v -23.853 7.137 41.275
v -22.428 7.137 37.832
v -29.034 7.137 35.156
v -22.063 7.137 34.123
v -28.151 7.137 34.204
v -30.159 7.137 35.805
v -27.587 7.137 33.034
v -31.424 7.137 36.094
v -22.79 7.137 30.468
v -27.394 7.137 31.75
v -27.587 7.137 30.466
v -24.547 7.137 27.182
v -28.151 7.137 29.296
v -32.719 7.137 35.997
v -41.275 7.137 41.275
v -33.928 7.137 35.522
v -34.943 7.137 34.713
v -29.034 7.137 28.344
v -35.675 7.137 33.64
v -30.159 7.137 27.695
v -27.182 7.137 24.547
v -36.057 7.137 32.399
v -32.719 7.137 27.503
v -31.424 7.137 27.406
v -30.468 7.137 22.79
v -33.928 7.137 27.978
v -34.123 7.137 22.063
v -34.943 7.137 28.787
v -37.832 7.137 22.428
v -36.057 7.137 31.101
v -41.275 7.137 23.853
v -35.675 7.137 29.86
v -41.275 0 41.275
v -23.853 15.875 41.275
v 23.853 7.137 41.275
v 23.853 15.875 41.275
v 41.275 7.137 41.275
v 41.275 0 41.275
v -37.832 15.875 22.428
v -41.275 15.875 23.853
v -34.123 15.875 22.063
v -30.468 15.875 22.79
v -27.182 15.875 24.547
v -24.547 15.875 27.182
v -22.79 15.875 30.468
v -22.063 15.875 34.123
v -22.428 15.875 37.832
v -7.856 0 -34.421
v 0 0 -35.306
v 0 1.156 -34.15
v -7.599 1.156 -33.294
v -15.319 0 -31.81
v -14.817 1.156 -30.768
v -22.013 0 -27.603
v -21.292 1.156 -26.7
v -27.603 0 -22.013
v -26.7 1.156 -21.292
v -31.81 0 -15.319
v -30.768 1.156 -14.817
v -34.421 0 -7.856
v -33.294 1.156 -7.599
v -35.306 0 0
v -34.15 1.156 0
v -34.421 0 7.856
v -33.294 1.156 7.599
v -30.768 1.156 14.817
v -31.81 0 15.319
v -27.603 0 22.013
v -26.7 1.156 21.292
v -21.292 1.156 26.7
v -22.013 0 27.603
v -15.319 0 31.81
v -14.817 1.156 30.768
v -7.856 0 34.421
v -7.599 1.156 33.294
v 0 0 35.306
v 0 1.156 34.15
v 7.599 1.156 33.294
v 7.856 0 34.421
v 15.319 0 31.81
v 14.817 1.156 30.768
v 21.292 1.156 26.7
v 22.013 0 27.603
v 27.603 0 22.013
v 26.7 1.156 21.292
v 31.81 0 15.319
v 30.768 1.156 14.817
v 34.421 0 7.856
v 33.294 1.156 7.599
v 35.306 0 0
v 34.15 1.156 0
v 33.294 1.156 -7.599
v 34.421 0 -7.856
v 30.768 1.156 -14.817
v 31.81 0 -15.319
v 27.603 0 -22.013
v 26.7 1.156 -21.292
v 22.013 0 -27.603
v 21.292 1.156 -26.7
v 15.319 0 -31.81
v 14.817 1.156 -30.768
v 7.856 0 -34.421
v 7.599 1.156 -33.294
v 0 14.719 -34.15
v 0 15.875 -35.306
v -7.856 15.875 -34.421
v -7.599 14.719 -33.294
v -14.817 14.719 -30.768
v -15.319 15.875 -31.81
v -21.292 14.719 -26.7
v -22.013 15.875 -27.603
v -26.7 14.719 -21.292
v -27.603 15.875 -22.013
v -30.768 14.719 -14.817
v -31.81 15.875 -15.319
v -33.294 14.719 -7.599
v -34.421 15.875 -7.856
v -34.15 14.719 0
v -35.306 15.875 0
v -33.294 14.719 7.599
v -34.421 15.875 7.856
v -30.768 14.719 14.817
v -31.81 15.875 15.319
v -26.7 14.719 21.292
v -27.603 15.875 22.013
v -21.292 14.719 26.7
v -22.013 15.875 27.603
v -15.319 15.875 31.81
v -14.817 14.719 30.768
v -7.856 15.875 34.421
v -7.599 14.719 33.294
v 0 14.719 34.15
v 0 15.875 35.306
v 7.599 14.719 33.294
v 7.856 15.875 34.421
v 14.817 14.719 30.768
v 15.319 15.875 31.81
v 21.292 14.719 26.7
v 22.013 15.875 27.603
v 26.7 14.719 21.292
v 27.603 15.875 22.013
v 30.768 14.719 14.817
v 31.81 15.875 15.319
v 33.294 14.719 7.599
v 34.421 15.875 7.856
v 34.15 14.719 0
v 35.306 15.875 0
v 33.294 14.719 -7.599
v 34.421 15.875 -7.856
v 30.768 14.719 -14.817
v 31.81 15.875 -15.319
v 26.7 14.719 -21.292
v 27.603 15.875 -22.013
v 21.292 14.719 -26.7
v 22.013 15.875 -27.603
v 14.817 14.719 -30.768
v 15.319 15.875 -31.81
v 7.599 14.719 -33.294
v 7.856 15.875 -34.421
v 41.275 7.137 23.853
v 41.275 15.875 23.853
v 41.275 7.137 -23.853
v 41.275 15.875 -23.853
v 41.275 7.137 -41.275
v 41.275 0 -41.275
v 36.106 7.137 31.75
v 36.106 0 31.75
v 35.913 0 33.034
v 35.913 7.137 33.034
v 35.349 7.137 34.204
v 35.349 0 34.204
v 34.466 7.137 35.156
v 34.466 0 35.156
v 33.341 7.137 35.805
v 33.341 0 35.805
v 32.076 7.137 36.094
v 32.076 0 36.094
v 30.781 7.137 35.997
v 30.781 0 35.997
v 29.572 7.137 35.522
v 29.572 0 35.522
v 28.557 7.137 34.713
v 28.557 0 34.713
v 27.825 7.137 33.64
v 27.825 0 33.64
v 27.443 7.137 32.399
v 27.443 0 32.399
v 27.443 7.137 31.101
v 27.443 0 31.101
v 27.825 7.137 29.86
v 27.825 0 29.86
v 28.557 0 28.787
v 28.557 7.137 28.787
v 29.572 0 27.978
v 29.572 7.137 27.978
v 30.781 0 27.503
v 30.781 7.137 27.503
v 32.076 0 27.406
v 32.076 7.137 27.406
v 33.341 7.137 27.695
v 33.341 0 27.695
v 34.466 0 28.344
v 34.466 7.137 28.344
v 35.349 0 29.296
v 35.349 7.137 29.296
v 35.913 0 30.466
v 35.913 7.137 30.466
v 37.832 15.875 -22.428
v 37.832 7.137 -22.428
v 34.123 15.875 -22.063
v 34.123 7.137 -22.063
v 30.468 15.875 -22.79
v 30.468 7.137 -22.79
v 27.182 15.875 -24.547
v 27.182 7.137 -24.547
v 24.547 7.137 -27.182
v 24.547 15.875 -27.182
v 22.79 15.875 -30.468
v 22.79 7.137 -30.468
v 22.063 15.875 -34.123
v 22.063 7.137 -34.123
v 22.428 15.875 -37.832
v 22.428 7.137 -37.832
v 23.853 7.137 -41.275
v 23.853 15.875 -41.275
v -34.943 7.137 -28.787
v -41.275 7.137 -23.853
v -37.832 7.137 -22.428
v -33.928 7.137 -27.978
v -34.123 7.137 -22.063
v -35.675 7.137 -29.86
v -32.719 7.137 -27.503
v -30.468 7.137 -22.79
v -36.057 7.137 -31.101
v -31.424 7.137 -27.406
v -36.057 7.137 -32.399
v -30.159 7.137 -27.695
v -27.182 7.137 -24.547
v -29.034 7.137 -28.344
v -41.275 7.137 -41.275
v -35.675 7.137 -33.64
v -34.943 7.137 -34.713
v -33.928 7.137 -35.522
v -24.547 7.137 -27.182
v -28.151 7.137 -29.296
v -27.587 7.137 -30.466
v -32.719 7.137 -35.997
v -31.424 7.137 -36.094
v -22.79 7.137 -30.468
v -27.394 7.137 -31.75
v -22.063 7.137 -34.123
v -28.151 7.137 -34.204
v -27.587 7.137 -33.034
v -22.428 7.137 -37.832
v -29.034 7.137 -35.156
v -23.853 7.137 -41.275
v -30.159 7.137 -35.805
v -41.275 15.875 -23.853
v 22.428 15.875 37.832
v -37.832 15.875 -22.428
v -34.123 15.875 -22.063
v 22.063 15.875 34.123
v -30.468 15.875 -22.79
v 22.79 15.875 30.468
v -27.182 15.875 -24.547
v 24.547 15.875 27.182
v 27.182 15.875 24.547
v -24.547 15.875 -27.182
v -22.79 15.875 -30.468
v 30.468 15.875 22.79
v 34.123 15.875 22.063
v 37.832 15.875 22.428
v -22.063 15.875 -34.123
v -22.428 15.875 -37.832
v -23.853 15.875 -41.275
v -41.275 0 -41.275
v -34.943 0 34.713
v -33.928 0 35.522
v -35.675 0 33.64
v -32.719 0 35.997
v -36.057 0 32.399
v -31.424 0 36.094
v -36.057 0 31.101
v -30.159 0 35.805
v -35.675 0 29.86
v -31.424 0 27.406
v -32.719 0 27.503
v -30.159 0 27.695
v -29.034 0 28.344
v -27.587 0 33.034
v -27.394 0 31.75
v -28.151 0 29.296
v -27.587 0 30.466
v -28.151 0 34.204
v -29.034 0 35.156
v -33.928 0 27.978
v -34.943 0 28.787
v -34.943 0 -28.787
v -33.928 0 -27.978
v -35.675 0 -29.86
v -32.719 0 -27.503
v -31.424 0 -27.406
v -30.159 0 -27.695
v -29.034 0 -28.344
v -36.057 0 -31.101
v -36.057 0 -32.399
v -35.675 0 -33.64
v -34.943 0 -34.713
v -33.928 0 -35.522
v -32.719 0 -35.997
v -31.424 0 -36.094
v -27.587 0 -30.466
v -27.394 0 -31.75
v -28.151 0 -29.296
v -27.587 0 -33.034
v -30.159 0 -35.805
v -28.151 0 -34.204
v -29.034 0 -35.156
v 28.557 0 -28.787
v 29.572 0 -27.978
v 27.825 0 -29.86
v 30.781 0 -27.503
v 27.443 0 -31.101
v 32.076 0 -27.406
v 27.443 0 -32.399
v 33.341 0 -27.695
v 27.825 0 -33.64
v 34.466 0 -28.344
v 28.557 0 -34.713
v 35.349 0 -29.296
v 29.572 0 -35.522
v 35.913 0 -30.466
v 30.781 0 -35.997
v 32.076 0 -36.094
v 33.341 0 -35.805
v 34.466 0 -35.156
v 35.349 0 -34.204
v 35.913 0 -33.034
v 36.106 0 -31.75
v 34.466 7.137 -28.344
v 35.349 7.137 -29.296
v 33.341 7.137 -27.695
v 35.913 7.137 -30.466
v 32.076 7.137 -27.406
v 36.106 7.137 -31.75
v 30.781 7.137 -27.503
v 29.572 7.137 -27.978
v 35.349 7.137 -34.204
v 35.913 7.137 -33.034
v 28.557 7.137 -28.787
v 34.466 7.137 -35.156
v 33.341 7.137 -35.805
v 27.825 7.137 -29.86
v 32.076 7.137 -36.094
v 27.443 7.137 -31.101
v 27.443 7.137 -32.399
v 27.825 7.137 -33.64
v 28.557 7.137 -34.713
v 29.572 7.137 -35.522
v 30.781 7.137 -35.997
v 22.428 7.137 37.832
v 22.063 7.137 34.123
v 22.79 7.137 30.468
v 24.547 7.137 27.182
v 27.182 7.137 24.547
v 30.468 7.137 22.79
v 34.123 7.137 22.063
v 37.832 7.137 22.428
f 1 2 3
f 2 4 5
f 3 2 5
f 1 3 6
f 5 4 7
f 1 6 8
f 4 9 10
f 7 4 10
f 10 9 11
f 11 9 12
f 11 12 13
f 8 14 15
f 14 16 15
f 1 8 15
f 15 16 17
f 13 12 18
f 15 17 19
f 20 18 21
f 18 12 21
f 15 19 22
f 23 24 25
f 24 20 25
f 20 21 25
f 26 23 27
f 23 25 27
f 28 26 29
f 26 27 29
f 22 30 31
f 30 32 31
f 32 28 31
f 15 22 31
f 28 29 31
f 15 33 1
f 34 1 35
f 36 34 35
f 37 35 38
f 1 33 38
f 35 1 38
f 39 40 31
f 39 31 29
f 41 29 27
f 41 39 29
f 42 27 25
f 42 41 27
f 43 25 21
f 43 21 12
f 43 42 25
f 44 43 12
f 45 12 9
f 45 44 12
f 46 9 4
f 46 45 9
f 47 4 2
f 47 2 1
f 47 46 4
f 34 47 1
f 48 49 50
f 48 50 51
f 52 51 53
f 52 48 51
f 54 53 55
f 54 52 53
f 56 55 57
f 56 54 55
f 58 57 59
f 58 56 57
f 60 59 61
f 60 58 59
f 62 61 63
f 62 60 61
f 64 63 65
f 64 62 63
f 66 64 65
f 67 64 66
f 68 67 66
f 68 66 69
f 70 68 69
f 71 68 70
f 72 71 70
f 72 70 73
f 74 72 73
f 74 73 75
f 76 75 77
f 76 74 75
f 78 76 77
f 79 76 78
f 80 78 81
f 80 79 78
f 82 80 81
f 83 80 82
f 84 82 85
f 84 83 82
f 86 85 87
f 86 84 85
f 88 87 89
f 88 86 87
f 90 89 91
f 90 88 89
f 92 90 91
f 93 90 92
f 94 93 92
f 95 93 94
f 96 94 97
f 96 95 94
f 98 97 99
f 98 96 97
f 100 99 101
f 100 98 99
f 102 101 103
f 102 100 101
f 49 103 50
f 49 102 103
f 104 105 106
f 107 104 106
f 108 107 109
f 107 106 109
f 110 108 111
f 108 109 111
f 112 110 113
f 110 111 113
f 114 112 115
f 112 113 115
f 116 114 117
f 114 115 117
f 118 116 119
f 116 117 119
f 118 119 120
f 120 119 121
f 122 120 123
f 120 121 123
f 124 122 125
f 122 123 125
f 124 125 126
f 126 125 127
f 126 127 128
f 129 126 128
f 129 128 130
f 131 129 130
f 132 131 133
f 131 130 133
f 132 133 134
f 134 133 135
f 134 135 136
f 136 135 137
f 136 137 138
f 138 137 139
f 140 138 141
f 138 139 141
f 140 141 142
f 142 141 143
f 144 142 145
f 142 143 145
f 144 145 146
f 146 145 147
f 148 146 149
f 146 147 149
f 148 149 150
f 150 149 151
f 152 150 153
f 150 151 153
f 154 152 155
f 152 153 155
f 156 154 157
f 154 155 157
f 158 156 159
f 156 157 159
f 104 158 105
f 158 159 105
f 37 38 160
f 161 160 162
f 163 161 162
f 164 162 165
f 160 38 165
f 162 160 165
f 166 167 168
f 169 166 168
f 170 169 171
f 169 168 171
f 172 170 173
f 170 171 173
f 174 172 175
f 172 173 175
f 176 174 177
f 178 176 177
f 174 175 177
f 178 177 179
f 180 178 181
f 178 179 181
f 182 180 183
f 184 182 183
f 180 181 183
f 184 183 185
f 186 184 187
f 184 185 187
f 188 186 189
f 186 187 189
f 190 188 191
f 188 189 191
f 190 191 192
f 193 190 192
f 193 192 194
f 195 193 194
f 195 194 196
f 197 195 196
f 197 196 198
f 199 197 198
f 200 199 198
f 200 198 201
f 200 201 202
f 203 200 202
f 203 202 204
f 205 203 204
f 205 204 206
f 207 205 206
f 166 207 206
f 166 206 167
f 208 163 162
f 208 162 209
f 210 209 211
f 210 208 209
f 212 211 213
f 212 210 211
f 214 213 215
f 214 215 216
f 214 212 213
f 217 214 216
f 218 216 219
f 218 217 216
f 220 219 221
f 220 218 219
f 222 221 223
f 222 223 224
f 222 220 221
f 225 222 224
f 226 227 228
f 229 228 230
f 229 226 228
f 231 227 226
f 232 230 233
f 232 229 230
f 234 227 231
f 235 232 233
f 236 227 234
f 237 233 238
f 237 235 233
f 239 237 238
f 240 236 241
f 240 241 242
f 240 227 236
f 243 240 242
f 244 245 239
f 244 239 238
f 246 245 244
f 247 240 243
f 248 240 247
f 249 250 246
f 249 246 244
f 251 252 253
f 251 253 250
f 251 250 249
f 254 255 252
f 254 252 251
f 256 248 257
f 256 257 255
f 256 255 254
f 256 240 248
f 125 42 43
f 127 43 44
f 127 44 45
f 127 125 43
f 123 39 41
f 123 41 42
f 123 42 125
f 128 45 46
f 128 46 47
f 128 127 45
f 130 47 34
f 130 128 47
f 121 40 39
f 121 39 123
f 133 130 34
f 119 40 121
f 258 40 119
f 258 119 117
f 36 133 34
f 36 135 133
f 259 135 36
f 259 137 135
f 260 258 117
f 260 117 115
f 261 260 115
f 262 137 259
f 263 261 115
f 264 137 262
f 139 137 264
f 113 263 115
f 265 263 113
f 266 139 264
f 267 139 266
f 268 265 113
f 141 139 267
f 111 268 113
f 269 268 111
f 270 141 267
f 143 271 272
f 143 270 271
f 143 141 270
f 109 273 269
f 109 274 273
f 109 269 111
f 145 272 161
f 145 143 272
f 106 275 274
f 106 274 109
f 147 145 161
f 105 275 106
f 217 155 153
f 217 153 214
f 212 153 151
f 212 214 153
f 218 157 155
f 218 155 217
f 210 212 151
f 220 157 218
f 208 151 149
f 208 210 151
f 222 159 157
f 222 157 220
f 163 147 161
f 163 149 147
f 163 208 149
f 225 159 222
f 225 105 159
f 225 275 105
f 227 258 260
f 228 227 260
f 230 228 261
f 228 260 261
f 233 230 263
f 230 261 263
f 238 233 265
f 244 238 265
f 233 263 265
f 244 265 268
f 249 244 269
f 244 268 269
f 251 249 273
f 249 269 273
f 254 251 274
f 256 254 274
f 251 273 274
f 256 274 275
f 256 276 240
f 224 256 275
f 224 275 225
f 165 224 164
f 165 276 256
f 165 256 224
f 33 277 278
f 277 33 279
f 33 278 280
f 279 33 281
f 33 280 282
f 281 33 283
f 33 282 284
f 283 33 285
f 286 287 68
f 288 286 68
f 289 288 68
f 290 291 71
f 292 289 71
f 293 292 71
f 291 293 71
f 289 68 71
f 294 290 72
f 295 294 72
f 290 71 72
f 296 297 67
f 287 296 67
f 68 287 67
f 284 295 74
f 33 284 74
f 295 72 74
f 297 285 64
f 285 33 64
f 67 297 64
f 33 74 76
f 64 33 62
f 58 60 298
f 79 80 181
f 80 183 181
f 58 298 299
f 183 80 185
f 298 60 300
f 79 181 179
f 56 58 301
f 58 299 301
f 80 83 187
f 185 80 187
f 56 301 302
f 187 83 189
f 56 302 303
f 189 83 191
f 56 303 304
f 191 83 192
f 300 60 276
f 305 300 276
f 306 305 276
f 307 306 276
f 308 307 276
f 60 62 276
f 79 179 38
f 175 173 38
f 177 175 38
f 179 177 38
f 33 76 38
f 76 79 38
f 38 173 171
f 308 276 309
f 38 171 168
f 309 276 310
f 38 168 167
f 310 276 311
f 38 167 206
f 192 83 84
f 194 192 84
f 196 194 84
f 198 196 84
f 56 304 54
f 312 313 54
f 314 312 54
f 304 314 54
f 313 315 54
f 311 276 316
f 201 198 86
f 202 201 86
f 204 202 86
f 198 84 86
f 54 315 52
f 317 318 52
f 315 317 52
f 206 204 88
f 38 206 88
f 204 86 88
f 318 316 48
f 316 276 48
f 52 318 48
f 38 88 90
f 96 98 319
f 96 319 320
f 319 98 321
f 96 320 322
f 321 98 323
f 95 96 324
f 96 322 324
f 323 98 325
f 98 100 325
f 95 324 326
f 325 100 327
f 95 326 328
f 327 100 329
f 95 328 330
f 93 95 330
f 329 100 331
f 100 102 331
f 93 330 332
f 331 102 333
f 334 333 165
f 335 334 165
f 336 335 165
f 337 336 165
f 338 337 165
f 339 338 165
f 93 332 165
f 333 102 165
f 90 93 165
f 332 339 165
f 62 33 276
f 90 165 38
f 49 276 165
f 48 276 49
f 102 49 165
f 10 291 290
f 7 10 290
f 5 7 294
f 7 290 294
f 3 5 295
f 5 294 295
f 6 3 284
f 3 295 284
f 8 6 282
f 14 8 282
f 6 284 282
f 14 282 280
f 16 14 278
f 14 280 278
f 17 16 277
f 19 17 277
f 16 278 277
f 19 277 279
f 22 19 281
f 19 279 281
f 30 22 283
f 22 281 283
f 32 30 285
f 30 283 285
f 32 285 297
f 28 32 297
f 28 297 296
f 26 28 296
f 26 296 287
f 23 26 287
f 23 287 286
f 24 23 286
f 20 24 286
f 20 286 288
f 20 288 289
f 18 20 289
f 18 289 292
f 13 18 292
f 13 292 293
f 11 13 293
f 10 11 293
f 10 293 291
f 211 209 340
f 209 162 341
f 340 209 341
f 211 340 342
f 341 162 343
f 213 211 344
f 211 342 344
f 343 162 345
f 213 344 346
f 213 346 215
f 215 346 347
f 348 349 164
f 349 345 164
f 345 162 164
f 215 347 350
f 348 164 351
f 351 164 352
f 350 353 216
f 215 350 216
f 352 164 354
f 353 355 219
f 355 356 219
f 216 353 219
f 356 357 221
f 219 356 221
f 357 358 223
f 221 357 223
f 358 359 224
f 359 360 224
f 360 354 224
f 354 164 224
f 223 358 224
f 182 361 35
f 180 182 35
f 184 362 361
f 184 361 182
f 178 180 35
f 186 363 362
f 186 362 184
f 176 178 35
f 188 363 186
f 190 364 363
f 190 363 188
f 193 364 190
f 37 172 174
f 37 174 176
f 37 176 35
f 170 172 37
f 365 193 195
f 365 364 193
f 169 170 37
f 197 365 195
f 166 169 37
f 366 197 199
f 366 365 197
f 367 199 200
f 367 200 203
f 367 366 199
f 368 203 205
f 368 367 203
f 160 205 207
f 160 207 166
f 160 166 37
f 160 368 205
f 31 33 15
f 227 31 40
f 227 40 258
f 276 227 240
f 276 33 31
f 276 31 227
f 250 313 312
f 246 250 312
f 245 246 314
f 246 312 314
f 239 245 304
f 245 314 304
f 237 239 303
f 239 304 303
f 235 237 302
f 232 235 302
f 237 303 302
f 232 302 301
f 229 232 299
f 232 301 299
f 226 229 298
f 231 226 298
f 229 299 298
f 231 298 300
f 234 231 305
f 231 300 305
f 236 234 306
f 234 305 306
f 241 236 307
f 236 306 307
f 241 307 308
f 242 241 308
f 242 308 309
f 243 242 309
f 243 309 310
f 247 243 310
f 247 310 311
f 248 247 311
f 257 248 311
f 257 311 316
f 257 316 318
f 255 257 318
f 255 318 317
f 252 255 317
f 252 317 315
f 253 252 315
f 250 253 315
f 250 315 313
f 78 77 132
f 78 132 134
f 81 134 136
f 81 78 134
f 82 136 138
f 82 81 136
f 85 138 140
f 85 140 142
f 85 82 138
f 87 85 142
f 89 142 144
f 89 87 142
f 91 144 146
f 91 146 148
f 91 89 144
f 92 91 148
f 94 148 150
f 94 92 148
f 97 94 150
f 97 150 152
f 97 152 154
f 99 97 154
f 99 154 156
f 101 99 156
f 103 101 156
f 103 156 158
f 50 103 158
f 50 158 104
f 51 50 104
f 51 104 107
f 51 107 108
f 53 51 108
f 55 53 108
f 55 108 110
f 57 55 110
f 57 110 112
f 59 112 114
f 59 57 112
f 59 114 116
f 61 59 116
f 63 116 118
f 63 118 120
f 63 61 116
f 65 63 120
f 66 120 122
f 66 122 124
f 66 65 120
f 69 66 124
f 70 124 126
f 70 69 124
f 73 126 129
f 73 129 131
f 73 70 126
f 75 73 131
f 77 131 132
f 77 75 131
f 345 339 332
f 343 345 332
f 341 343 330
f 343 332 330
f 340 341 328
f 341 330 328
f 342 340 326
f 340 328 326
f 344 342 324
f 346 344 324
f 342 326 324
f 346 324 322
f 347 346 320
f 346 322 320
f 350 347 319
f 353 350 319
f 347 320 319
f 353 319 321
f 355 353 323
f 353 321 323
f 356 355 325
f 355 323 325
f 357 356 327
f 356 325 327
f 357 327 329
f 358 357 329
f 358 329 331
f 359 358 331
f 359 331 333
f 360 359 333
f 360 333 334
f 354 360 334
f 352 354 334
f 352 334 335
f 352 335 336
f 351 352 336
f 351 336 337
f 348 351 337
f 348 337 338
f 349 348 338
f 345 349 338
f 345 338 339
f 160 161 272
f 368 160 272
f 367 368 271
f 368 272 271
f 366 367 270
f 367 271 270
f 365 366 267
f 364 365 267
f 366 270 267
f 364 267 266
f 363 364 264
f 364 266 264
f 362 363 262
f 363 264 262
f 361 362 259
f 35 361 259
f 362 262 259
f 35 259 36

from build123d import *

# Parameters (mm, degrees)
SKETCH1_W          = 82.55
SKETCH1_H          = 82.55
SKETCH1_R          = 34.1503
EXTRUDE1_DEPTH     = 15.875
CUT_EXTRUDE1_DEPTH = 8.7376
HOLE1_D            = 8.7122
HOLE1_DEPTH        = 7.1374


with BuildPart() as part:
    # Sketch1 → Extrude1 (new body)
    with BuildSketch(Plane(origin=(0, 0, 0), x_dir=(1, 0, 0), z_dir=(0, 1, 0))):
        Rectangle(SKETCH1_W, SKETCH1_H)
        with Locations(Location((0, 0, 0), (0, 0, 270))):  # turned: the seam where the file's is
            Circle(SKETCH1_R, mode=Mode.SUBTRACT)
    extrude(amount=EXTRUDE1_DEPTH)

    # Sketch2 → Cut-Extrude1 (cut)
    with BuildSketch(Plane(origin=(0, 15.875, 0), x_dir=(1, 0, 0), z_dir=(0, 1, 0))):
        with BuildLine():
            Line((23.853264661, -41.275), (41.275, -41.275))
            Line((41.275, -41.275), (41.275, -23.853264661))
            ThreePointArc((41.275, -23.853264661), (25.766943879, -25.766943879), (23.853264661, -41.275))
        make_face()
        with BuildLine():
            Line((41.275, 41.275), (41.275, 23.853264661))
            ThreePointArc((41.275, 23.853264661), (25.766943879, 25.766943879), (23.853264661, 41.275))
            Line((23.853264661, 41.275), (41.275, 41.275))
        make_face()
        with BuildLine():
            Line((-23.853264661, 41.275), (-41.275, 41.275))
            Line((-41.275, 41.275), (-41.275, 23.853264661))
            ThreePointArc((-41.275, 23.853264661), (-25.766943879, 25.766943879), (-23.853264661, 41.275))
        make_face()
        with BuildLine():
            Line((-41.275, -41.275), (-41.275, -23.853264661))
            ThreePointArc((-41.275, -23.853264661), (-25.766943879, -25.766943879), (-23.853264661, -41.275))
            Line((-23.853264661, -41.275), (-41.275, -41.275))
        make_face()
    extrude(amount=-CUT_EXTRUDE1_DEPTH, mode=Mode.SUBTRACT)

    # Hole1
    with Locations(Plane(origin=(0, 7.1374, 0), x_dir=(-1, 0, 0), z_dir=(0, 1, 0))):
        with Locations((31.75, 31.75), (31.75, -31.75), (-31.75, 31.75), (-31.75, -31.75)):
            Hole(HOLE1_D / 2, depth=HOLE1_DEPTH)

    # Sketch5 → Cut-Revolve1 (revolve, cut)
    with BuildSketch(Plane(origin=(0, 0, 0), x_dir=(0, 0, -1), z_dir=(1, 0, 0)), mode=Mode.PRIVATE) as cut_revolve1_sk:
        Polygon((-35.306, 15.875), (-34.1503, 15.875), (-34.1503, 14.7193), align=None)
        Polygon((-34.1503, 1.1557), (-35.306, 0), (-34.1503, 0), align=None)
    revolve(cut_revolve1_sk.sketch.rotate(Axis((0, 0, 0), (0, 1, 0)), 180), axis=Axis((0, 0, 0), (0, 1, 0)), mode=Mode.SUBTRACT)  # turned: the seam where the file's is


solid = part.part
